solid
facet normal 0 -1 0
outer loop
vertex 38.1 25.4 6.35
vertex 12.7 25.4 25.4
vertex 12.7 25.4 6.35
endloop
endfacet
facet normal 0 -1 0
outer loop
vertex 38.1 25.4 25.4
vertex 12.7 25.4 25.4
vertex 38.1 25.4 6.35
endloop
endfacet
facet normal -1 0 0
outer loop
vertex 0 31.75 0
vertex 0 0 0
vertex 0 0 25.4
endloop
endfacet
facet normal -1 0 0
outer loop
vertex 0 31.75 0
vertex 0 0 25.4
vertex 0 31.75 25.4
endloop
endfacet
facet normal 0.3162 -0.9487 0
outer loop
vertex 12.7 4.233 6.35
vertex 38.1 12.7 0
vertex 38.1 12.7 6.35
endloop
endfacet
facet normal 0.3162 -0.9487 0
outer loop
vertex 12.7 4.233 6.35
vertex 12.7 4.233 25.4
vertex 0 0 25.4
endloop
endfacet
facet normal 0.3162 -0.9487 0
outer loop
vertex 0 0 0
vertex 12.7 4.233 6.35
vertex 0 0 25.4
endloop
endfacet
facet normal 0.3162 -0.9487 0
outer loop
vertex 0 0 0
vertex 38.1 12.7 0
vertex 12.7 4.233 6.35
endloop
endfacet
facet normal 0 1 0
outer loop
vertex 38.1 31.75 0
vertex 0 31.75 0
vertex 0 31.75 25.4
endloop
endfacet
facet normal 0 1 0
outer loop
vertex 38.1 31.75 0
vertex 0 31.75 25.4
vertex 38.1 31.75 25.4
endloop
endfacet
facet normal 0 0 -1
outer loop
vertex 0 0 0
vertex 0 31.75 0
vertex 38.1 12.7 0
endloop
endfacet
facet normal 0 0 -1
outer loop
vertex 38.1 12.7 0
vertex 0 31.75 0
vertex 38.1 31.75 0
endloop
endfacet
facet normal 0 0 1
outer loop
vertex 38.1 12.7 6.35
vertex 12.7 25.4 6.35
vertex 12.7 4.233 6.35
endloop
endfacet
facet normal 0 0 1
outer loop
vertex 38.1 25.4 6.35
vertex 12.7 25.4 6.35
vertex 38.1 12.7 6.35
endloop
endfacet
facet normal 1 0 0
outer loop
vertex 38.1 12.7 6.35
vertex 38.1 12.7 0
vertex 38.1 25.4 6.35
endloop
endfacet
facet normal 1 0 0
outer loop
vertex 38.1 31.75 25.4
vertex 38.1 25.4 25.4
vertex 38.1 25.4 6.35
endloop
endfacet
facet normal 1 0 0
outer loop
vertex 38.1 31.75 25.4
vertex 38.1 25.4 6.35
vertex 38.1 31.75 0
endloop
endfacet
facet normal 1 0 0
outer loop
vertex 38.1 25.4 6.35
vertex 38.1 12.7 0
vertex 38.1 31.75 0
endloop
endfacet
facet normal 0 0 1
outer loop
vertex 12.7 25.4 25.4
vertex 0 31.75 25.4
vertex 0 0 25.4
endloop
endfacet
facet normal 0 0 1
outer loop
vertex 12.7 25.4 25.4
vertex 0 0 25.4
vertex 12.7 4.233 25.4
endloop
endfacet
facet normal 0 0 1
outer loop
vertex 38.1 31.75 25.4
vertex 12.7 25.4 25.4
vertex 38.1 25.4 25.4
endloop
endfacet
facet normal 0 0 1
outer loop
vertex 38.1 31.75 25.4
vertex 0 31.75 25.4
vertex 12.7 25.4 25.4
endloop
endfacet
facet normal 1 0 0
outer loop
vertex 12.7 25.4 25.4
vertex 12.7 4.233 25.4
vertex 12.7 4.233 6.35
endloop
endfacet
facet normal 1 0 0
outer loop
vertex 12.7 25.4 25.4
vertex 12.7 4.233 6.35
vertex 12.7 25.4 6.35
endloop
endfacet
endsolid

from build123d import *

# Parameters (mm, degrees)
F0_W     = 38.1
F0_H     = 31.75
F1_DEPTH = 25.4
F2_W     = 25.4
F2_H     = 25.4
F3_DEPTH = 19.05
F5_DEPTH = 25.4


with BuildPart() as f1:
    # F0 (on Top) → F1 (new body)
    with BuildSketch(Plane.XY):
        with Locations((19.05, 15.875)):
            Rectangle(F0_W, F0_H)
    extrude(amount=F1_DEPTH)

    # F2 (on face) → F3 (cut)
    with BuildSketch(Plane.XY.offset(25.4)):
        with Locations((25.4, 12.7)):
            Rectangle(F2_W, F2_H)
    extrude(amount=-F3_DEPTH, mode=Mode.SUBTRACT)

    # F4 (on Top) → F5 (cut)
    with BuildSketch(Plane.XY):
        Polygon((38.1, 12.7), (0, 0), (38.1, 0), align=None)
    extrude(amount=F5_DEPTH, mode=Mode.SUBTRACT)


solid = f1.part
